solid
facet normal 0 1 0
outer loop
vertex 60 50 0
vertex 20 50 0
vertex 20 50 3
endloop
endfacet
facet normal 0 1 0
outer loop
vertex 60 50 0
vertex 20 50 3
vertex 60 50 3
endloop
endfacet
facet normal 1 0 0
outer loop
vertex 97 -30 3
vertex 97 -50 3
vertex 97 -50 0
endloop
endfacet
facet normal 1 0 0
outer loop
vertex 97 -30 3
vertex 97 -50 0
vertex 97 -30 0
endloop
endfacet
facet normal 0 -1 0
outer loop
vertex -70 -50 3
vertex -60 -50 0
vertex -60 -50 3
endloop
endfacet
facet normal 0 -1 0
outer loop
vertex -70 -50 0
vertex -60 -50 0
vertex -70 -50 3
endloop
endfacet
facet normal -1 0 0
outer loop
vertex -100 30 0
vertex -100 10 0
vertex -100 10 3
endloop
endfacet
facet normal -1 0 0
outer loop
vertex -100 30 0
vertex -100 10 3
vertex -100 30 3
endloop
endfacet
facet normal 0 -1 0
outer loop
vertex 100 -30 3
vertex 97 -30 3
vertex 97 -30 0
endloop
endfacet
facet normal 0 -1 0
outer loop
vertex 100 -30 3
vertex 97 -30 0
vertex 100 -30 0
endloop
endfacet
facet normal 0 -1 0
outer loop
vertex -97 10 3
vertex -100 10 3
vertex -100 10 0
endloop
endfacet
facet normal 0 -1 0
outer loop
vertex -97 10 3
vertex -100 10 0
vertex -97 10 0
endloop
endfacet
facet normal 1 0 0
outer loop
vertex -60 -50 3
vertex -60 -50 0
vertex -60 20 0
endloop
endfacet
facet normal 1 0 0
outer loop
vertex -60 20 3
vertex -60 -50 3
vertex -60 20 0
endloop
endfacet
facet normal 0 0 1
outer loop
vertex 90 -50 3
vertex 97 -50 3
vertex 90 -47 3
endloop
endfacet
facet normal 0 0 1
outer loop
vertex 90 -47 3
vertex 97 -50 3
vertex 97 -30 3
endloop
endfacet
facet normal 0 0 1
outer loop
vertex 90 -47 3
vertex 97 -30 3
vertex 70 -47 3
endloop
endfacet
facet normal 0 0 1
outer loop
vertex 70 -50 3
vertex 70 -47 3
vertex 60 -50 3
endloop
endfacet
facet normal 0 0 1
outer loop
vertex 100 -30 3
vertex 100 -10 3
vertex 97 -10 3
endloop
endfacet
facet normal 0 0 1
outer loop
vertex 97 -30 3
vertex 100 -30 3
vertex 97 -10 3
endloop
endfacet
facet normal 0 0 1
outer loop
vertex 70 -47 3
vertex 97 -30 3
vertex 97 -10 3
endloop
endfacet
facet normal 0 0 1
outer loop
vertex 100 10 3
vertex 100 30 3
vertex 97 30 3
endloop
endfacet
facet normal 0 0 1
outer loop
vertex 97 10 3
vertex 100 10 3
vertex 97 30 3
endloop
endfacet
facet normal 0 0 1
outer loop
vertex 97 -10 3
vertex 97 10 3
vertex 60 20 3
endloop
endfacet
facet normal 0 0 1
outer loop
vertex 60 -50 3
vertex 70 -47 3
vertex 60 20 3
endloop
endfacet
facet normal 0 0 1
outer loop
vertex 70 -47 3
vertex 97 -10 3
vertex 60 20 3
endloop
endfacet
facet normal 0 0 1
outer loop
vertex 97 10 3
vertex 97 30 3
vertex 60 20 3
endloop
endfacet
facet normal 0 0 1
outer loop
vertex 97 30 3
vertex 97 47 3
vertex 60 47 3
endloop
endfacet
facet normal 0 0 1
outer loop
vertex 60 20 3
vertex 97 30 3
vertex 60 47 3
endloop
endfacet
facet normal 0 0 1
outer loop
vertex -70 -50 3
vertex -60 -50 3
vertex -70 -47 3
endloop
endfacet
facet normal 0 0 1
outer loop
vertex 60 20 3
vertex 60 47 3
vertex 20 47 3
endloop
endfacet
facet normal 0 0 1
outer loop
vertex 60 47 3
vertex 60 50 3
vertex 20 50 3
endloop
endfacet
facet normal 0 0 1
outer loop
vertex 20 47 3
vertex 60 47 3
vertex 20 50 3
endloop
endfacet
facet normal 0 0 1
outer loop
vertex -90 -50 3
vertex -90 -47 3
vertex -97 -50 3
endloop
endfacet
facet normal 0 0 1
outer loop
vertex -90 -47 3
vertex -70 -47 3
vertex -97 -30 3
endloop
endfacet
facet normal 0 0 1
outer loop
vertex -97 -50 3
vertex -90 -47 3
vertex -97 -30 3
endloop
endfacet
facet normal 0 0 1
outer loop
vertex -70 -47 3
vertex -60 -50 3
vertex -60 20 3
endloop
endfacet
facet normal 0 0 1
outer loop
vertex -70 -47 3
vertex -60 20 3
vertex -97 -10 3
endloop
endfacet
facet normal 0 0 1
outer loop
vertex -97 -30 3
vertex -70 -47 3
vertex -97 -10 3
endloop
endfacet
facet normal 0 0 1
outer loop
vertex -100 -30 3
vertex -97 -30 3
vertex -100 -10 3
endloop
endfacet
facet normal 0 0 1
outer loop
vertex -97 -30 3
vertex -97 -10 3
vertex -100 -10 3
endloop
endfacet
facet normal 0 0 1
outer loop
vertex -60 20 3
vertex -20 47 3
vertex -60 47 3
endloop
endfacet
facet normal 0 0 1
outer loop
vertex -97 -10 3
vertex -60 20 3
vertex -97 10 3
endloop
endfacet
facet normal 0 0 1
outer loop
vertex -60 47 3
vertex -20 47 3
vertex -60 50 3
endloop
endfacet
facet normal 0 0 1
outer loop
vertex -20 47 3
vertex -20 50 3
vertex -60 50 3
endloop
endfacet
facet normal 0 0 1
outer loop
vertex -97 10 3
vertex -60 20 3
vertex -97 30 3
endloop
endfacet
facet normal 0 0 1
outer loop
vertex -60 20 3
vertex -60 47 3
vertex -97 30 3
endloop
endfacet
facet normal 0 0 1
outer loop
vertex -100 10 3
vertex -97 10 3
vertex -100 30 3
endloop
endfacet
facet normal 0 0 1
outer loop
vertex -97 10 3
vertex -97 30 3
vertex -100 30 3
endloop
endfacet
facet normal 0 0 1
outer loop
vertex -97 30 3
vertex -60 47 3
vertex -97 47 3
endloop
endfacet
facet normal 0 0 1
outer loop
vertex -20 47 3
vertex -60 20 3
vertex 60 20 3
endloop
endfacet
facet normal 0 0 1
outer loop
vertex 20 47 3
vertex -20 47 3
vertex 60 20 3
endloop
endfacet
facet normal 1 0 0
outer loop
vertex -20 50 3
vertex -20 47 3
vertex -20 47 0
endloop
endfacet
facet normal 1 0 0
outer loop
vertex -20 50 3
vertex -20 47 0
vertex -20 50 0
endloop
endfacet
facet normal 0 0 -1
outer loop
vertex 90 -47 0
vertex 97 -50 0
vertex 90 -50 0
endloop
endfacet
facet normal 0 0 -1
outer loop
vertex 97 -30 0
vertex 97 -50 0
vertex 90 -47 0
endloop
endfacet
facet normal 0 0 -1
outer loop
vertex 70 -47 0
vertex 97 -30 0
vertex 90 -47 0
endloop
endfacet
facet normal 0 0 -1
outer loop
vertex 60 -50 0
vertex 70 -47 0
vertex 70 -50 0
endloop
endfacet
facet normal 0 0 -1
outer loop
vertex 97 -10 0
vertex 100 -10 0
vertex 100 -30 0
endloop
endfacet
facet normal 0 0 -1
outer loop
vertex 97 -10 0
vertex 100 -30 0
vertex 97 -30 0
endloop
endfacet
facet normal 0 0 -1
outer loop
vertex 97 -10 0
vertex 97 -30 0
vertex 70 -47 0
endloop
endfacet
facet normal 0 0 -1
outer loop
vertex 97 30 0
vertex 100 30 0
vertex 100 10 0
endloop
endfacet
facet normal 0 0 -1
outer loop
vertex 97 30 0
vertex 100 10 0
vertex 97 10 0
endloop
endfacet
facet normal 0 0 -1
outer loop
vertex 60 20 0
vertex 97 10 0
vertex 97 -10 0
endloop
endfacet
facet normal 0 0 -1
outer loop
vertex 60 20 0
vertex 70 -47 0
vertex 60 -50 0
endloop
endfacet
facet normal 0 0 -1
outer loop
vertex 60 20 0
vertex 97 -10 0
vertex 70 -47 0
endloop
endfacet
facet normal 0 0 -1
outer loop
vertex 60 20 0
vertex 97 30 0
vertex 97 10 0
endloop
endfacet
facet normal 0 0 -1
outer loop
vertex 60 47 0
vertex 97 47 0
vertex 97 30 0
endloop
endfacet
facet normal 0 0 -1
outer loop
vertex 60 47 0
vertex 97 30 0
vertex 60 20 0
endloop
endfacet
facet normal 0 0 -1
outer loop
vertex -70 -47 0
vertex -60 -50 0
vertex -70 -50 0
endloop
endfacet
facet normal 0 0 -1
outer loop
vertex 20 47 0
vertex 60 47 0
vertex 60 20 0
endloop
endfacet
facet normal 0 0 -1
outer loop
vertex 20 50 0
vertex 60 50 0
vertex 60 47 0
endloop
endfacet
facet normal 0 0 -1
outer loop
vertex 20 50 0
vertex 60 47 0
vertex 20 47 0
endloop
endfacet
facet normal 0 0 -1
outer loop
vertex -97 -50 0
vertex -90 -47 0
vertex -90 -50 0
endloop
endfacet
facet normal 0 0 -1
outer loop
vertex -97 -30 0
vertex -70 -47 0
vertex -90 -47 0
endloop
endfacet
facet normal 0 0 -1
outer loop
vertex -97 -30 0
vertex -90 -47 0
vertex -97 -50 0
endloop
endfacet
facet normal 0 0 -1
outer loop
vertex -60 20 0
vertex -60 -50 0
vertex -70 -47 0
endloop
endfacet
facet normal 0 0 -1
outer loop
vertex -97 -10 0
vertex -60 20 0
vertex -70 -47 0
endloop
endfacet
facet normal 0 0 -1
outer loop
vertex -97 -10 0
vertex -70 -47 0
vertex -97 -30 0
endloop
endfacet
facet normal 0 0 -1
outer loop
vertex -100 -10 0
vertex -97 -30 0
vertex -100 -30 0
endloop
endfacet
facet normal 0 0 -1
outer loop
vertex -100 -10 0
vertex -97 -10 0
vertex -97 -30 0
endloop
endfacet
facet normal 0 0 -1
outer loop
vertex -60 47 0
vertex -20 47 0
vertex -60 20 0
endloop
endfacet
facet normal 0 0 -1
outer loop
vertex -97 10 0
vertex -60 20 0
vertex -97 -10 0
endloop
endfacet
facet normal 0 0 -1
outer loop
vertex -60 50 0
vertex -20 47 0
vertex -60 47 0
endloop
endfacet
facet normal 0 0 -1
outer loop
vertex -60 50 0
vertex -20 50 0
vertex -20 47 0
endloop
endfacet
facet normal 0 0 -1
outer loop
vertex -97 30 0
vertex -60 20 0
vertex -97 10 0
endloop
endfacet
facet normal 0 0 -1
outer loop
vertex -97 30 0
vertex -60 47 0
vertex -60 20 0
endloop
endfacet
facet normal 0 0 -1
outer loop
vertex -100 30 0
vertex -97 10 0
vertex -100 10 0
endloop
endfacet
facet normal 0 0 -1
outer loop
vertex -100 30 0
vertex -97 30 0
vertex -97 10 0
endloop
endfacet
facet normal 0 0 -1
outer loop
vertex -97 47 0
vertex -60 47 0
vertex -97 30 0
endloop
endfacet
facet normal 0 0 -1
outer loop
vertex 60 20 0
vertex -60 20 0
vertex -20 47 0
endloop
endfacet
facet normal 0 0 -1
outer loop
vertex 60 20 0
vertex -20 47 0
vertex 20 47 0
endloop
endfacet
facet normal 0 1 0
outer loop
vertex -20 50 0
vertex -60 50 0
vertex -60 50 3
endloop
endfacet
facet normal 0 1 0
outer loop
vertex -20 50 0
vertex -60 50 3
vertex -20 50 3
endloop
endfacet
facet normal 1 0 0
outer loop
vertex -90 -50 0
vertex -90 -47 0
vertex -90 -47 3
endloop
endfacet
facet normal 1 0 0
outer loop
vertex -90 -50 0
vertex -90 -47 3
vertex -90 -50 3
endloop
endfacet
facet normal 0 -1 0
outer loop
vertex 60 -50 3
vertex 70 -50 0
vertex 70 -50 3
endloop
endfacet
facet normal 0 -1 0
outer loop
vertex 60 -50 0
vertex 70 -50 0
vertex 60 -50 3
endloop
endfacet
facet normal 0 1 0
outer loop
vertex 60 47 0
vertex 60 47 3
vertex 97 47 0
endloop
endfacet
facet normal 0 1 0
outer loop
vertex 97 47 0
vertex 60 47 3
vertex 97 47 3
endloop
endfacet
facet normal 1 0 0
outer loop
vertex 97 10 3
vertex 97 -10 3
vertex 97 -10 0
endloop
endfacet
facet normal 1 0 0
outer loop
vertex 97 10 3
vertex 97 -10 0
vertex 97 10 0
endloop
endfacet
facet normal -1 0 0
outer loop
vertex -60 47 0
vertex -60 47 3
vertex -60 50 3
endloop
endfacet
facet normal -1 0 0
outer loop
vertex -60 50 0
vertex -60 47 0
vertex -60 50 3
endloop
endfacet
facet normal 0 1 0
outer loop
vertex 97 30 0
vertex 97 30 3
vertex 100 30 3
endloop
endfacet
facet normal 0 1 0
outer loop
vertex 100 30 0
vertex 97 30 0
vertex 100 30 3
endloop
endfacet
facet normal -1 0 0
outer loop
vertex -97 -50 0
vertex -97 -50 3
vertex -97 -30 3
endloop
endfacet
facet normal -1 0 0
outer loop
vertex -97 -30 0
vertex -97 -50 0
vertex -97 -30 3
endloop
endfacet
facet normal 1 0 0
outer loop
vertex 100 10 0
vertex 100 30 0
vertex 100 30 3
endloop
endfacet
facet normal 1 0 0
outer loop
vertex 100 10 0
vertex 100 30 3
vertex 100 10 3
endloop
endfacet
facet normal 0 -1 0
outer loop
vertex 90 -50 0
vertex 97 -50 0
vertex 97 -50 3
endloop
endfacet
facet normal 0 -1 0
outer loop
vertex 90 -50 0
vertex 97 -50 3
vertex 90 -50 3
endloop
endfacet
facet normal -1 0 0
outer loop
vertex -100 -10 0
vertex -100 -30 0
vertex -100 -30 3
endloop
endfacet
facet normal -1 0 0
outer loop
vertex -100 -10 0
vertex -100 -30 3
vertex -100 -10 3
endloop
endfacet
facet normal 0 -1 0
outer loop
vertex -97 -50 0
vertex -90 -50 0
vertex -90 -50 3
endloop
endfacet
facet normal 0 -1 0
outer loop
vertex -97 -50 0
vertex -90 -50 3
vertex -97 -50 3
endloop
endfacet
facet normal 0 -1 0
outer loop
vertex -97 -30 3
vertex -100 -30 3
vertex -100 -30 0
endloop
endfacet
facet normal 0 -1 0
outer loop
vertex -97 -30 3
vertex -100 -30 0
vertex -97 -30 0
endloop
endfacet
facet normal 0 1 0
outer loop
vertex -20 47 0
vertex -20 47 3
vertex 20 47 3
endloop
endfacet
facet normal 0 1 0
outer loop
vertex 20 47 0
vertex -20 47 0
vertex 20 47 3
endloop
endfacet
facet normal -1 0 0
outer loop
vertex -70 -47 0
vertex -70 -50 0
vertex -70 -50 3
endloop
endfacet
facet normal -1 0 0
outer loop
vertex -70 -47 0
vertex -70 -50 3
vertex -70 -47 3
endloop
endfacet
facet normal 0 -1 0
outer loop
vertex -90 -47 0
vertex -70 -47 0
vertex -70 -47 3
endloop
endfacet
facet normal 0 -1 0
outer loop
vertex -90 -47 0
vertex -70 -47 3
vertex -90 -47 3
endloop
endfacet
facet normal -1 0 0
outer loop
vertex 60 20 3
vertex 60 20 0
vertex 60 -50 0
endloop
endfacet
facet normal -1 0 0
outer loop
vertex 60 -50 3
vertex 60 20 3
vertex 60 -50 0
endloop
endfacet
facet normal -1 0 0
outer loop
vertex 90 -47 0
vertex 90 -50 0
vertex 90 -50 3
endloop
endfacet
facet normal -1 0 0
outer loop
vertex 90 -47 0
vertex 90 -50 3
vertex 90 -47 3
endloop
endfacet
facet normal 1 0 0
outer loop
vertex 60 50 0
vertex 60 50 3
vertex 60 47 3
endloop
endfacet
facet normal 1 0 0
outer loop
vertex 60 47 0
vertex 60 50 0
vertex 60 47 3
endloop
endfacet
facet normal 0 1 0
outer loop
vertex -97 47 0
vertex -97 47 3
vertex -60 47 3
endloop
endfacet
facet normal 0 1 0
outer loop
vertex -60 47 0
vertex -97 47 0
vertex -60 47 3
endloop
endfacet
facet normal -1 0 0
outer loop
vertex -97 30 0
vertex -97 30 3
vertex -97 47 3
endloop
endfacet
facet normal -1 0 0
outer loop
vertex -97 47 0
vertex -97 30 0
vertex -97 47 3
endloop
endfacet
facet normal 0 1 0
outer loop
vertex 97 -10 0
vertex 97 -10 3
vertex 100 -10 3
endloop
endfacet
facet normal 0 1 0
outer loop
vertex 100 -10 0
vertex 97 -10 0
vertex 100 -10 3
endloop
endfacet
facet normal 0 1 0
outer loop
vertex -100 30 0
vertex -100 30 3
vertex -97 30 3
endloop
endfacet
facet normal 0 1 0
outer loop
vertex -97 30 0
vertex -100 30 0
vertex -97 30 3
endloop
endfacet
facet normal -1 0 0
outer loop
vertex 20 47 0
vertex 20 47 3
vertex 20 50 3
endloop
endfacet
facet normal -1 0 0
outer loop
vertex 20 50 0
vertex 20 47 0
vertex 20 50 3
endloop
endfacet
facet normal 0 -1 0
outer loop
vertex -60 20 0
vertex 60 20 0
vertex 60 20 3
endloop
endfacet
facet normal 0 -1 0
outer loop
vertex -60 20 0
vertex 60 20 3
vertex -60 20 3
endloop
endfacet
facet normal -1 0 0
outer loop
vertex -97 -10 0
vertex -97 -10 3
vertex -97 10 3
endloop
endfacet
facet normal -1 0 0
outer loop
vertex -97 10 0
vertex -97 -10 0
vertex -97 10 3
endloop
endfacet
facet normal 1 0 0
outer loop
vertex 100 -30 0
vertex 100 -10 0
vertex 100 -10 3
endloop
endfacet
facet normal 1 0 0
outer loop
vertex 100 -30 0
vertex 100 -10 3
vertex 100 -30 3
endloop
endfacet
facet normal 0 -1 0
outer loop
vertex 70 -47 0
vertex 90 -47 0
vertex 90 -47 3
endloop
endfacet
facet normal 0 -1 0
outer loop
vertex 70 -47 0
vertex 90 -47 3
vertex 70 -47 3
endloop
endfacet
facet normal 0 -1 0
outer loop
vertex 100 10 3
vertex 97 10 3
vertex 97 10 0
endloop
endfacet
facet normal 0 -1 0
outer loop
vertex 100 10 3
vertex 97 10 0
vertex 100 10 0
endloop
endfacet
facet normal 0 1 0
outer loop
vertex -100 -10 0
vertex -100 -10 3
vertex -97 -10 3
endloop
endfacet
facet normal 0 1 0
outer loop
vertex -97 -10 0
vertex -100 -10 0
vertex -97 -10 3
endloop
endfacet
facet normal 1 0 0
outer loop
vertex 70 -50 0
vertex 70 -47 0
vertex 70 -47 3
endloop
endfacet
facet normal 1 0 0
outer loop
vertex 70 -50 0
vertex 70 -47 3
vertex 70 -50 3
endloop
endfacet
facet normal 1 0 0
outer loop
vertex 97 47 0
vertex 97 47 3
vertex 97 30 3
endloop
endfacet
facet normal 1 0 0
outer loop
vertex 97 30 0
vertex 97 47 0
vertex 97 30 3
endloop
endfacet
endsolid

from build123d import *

# Parameters (mm, degrees)
BOSS_EXTRUDE1_DEPTH = 3
SKETCH2_W           = 3
SKETCH2_H           = 20
SKETCH2_W_2         = 40
SKETCH2_H_2         = 3
CUT_EXTRUDE2_DEPTH  = 3


with BuildPart() as part:
    # Sketch1 → Boss-Extrude1 (new body)
    with BuildSketch(Plane.XY):
        Polygon((-60, 5.09773753), (-60, -50), (-70, -50), (-70, -47), (-90, -47), (-90, -50), (-100, -50), (-100, 50), (100, 50), (100, -50), (90, -50), (90, -47), (70, -47), (70, -50), (60, -50), (60, -40.178411678), (60, 20), (-60, 20), align=None)
    extrude(amount=BOSS_EXTRUDE1_DEPTH)

    # Sketch2 → Cut-Extrude2 (cut)
    with BuildSketch(Plane.XY.offset(3)):
        Polygon((-100, 47), (-100, 30), (-97, 30), (-97, 47), (-60, 47), (-60, 50), (-100, 50), align=None)
        with Locations((-98.5, 0)):
            Rectangle(SKETCH2_W, SKETCH2_H)
        with Locations((-98.5, -40)):
            Rectangle(SKETCH2_W, SKETCH2_H)
        with Locations((0, 48.5)):
            Rectangle(SKETCH2_W_2, SKETCH2_H_2)
        Polygon((100, 50), (60, 50), (60, 47), (97, 47), (97, 30), (100, 30), (100, 47), align=None)
        with Locations((98.5, 0)):
            Rectangle(SKETCH2_W, SKETCH2_H)
        with Locations((98.5, -40)):
            Rectangle(SKETCH2_W, SKETCH2_H)
    extrude(amount=-CUT_EXTRUDE2_DEPTH, mode=Mode.SUBTRACT)


solid = part.part
